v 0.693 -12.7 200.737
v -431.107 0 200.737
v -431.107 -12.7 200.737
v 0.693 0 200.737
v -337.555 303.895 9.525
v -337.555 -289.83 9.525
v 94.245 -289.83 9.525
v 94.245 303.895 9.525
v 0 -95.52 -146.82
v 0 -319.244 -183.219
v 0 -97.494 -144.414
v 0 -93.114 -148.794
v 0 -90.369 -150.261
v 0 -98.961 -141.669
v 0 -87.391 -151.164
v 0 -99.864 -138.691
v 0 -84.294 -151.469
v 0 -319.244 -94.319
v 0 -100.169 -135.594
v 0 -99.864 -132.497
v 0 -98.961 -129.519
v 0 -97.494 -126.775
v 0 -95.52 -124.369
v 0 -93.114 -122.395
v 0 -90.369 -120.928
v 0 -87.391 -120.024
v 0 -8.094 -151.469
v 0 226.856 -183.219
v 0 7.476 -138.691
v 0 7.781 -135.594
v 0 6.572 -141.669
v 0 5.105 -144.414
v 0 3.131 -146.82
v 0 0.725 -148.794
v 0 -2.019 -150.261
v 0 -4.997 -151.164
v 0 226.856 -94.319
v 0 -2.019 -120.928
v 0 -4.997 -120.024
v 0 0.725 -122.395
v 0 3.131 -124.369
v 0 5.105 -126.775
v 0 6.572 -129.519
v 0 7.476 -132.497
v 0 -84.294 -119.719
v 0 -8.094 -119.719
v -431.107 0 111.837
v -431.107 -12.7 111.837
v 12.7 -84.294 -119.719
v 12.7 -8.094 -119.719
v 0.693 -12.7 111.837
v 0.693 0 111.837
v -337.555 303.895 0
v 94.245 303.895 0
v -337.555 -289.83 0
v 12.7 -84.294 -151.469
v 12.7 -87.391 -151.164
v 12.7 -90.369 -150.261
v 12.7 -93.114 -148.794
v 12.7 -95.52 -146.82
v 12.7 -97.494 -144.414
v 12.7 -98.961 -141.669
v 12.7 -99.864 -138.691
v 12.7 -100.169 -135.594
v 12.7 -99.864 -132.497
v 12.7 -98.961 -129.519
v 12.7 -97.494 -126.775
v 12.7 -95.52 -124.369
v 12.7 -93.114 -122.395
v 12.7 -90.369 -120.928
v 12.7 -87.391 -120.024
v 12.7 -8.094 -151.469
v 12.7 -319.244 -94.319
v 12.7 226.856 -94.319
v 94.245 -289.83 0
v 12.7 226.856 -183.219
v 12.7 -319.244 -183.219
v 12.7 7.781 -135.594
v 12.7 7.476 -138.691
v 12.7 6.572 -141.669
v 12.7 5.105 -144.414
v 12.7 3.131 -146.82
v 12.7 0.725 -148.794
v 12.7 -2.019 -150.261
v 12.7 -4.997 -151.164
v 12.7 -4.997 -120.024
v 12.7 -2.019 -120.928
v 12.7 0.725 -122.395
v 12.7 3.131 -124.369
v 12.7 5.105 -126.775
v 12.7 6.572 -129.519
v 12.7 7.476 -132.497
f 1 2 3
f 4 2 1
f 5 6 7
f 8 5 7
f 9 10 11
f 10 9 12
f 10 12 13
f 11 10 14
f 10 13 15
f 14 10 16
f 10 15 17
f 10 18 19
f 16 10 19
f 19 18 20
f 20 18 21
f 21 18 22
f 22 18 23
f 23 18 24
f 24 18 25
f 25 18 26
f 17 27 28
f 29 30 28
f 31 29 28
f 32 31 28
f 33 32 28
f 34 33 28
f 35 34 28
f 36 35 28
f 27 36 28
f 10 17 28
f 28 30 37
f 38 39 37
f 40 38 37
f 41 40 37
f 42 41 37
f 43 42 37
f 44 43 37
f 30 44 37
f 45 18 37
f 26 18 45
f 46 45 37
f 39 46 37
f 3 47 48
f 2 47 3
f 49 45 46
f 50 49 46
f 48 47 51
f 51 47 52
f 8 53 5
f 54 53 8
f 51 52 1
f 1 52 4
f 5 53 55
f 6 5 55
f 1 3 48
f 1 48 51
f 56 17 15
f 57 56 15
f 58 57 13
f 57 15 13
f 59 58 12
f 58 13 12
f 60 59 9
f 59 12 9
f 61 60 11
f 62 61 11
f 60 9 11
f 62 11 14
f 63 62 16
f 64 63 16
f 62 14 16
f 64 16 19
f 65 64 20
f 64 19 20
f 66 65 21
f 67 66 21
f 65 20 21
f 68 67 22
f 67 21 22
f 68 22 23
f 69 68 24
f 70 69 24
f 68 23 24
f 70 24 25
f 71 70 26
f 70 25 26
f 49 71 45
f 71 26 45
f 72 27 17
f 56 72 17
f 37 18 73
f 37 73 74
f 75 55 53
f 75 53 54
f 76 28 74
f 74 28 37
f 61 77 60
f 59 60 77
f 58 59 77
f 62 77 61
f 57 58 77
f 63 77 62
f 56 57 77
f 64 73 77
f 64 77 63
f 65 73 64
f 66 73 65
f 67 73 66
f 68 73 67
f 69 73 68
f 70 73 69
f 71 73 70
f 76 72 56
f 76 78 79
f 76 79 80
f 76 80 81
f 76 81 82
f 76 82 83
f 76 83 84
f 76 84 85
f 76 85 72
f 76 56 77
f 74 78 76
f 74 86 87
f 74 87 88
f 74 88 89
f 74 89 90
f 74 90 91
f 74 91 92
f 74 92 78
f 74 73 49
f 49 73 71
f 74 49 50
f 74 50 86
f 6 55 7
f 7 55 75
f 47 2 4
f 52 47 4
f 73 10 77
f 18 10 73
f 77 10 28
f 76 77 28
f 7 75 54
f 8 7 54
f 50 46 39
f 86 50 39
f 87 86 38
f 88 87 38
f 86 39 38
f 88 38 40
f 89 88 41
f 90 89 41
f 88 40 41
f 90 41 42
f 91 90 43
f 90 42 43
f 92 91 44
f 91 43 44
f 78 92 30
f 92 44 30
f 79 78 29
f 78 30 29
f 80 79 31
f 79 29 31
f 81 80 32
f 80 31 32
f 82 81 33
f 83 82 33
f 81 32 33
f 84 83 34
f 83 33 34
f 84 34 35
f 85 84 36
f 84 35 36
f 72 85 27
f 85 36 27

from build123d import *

# Parameters (mm, degrees)
F0_W     = 431.8
F0_H     = 14.2875
F0_H_2   = 565.15
F1_DEPTH = 9.525
F2_W     = 431.8
F2_H     = 88.9
F3_DEPTH = 12.7
F4_W     = 546.1
F4_H     = 88.9
F5_DEPTH = 12.7


with BuildPart() as f1:
    # F0 (on Top) → F1 (new body)
    with BuildSketch(Plane.XY):
        with Locations((-121.654975, -282.685882)):
            Rectangle(F0_W, F0_H)
        with Locations((-121.654975, 7.032868)):
            Rectangle(F0_W, F0_H_2)
        with Locations((-121.654975, 296.751618)):
            Rectangle(F0_W, F0_H)
    extrude(amount=F1_DEPTH)


with BuildPart() as f3:
    # F2 (on Front) → F3 (new body)
    with BuildSketch(Plane.XZ):
        with Locations((-215.207472, 156.28692)):
            Rectangle(F2_W, F2_H)
    extrude(amount=F3_DEPTH)


with BuildPart() as f5:
    # F4 (on Right) → F5 (new body)
    with BuildSketch(Plane.YZ):
        with Locations((-46.194336, -138.769281)):
            Rectangle(F4_W, F4_H)
        with BuildLine():
            ThreePointArc((-84.294336, -151.469281), (-100.169336, -135.594281), (-84.294336, -119.719281))
            Line((-84.294336, -119.719281), (-8.094336, -119.719281))
            ThreePointArc((-8.094336, -119.719281), (7.780664, -135.594281), (-8.094336, -151.469281))
            Line((-8.094336, -151.469281), (-84.294336, -151.469281))
        make_face(mode=Mode.SUBTRACT)
    extrude(amount=F5_DEPTH)


solid = Compound([f1.part, f3.part, f5.part])
